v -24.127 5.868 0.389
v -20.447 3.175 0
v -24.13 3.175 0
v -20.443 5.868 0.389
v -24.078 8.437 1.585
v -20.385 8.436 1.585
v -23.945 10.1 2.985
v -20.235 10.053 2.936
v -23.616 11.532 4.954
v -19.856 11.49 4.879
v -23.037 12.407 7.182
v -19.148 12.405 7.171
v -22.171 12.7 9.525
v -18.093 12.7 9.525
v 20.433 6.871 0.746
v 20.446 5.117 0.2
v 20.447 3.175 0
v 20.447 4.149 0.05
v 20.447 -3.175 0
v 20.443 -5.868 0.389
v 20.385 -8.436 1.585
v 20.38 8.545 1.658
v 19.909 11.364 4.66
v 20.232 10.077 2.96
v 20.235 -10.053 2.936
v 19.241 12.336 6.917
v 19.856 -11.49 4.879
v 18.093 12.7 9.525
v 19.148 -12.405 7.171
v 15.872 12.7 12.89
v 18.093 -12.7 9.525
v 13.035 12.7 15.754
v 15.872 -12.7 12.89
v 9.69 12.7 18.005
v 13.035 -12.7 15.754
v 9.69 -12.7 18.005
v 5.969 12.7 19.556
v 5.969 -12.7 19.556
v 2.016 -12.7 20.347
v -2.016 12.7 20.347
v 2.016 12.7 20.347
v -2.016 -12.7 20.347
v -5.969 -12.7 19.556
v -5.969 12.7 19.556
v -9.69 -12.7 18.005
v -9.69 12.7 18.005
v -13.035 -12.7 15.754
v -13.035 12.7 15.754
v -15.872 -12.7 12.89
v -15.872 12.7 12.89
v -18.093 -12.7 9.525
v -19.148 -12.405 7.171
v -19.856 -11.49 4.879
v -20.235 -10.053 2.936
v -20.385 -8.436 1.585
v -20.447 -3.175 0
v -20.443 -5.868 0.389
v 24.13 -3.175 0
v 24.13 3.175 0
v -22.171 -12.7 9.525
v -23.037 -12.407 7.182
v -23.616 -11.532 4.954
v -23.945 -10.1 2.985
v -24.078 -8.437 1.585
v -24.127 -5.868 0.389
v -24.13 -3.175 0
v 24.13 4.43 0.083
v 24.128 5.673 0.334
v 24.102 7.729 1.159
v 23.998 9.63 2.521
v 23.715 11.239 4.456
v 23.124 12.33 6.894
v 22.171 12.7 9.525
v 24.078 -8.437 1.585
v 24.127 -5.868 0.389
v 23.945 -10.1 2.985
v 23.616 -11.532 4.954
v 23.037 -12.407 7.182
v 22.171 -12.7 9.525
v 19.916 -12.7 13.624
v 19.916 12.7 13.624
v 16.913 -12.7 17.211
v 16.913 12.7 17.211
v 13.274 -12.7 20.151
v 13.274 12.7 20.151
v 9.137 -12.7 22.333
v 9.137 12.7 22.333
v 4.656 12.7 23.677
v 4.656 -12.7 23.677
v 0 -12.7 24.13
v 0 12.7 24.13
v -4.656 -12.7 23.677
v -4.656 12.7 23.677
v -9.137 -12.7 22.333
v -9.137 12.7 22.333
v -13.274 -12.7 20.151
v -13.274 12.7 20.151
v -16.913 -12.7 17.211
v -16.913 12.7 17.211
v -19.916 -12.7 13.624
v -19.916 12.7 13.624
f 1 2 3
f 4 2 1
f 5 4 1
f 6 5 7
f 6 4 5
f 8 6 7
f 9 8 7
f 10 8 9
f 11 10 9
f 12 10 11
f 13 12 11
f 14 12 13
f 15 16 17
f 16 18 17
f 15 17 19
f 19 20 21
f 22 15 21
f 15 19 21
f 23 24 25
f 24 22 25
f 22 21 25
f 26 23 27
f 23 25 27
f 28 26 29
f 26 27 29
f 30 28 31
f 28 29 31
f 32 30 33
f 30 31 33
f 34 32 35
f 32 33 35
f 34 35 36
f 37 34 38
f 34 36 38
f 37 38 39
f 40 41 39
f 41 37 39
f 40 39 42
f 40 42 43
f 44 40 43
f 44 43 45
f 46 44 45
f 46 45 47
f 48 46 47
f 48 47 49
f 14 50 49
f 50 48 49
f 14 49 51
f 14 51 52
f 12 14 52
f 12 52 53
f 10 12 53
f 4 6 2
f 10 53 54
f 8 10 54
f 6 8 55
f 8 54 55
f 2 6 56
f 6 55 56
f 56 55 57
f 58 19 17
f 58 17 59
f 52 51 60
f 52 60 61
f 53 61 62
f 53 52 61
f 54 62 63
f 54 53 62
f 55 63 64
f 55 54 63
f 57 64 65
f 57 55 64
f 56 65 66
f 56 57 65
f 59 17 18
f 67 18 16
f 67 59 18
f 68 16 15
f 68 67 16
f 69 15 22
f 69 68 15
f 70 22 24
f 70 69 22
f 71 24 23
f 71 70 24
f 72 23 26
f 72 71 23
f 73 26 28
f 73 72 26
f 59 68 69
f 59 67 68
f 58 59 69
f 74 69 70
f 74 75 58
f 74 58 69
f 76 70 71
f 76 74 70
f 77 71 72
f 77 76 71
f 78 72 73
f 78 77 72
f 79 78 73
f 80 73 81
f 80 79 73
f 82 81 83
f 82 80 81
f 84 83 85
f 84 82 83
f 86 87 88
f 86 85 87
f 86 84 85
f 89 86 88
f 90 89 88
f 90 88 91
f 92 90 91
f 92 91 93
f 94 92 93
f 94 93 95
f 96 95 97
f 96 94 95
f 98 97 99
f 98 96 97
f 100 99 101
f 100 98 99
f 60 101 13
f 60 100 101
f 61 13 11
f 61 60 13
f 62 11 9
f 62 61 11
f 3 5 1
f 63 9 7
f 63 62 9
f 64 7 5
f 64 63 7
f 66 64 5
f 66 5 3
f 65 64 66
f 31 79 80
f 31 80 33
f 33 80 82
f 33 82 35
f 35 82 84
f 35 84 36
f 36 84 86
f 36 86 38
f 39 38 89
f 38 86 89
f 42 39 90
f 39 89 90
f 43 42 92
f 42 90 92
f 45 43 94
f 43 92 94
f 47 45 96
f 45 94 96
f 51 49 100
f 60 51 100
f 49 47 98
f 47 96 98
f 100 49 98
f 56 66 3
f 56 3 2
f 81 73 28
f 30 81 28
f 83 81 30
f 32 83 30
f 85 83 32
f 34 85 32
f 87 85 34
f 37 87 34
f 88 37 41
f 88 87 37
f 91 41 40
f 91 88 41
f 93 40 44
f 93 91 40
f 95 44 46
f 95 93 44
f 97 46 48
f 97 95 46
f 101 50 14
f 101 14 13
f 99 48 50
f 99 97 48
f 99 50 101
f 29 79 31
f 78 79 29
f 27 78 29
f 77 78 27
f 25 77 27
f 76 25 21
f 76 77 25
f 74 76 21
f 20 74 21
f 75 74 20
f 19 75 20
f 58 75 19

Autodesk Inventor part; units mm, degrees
ref_plane "YZ Plane" through (0, 0, 0) normal (1, 0, 0) x (0, 1, 0)
ref_plane "XZ Plane" through (0, 0, 0) normal (0, 1, 0) x (-1, 0, 0)
ref_plane "XY Plane" through (0, 0, 0) normal (0, 0, 1) x (1, 0, 0)
sketch "Sketch1" plane through (0, 0, 0) normal (0, 1, 0) x (-1, 0, 0)
  arc A0 (24.13, 0) -> (-24.13, 0) centre (0, 0) ccw
  arc A1 (20.447, 0) -> (-20.447, 0) centre (0, 0) ccw
  line L0 (24.13, 0) -> (-24.13, 0)
  dimension "d0" = 48.26
  dimension "d1" = 40.894
extrude "Extrusion1" add sketch "Sketch1" along normal mid plane 25.4 contours L0 A1 A0
fillet "Fillet1" radius 9.525 4 edges at (-22.2885, 12.7, 0) (-22.2885, -12.7, 0) (22.2885, -12.7, 0) (22.2885, 12.7, 0)
properties part number "FE-120-004 Pivot Hardstop" material "PVC-Piping"
